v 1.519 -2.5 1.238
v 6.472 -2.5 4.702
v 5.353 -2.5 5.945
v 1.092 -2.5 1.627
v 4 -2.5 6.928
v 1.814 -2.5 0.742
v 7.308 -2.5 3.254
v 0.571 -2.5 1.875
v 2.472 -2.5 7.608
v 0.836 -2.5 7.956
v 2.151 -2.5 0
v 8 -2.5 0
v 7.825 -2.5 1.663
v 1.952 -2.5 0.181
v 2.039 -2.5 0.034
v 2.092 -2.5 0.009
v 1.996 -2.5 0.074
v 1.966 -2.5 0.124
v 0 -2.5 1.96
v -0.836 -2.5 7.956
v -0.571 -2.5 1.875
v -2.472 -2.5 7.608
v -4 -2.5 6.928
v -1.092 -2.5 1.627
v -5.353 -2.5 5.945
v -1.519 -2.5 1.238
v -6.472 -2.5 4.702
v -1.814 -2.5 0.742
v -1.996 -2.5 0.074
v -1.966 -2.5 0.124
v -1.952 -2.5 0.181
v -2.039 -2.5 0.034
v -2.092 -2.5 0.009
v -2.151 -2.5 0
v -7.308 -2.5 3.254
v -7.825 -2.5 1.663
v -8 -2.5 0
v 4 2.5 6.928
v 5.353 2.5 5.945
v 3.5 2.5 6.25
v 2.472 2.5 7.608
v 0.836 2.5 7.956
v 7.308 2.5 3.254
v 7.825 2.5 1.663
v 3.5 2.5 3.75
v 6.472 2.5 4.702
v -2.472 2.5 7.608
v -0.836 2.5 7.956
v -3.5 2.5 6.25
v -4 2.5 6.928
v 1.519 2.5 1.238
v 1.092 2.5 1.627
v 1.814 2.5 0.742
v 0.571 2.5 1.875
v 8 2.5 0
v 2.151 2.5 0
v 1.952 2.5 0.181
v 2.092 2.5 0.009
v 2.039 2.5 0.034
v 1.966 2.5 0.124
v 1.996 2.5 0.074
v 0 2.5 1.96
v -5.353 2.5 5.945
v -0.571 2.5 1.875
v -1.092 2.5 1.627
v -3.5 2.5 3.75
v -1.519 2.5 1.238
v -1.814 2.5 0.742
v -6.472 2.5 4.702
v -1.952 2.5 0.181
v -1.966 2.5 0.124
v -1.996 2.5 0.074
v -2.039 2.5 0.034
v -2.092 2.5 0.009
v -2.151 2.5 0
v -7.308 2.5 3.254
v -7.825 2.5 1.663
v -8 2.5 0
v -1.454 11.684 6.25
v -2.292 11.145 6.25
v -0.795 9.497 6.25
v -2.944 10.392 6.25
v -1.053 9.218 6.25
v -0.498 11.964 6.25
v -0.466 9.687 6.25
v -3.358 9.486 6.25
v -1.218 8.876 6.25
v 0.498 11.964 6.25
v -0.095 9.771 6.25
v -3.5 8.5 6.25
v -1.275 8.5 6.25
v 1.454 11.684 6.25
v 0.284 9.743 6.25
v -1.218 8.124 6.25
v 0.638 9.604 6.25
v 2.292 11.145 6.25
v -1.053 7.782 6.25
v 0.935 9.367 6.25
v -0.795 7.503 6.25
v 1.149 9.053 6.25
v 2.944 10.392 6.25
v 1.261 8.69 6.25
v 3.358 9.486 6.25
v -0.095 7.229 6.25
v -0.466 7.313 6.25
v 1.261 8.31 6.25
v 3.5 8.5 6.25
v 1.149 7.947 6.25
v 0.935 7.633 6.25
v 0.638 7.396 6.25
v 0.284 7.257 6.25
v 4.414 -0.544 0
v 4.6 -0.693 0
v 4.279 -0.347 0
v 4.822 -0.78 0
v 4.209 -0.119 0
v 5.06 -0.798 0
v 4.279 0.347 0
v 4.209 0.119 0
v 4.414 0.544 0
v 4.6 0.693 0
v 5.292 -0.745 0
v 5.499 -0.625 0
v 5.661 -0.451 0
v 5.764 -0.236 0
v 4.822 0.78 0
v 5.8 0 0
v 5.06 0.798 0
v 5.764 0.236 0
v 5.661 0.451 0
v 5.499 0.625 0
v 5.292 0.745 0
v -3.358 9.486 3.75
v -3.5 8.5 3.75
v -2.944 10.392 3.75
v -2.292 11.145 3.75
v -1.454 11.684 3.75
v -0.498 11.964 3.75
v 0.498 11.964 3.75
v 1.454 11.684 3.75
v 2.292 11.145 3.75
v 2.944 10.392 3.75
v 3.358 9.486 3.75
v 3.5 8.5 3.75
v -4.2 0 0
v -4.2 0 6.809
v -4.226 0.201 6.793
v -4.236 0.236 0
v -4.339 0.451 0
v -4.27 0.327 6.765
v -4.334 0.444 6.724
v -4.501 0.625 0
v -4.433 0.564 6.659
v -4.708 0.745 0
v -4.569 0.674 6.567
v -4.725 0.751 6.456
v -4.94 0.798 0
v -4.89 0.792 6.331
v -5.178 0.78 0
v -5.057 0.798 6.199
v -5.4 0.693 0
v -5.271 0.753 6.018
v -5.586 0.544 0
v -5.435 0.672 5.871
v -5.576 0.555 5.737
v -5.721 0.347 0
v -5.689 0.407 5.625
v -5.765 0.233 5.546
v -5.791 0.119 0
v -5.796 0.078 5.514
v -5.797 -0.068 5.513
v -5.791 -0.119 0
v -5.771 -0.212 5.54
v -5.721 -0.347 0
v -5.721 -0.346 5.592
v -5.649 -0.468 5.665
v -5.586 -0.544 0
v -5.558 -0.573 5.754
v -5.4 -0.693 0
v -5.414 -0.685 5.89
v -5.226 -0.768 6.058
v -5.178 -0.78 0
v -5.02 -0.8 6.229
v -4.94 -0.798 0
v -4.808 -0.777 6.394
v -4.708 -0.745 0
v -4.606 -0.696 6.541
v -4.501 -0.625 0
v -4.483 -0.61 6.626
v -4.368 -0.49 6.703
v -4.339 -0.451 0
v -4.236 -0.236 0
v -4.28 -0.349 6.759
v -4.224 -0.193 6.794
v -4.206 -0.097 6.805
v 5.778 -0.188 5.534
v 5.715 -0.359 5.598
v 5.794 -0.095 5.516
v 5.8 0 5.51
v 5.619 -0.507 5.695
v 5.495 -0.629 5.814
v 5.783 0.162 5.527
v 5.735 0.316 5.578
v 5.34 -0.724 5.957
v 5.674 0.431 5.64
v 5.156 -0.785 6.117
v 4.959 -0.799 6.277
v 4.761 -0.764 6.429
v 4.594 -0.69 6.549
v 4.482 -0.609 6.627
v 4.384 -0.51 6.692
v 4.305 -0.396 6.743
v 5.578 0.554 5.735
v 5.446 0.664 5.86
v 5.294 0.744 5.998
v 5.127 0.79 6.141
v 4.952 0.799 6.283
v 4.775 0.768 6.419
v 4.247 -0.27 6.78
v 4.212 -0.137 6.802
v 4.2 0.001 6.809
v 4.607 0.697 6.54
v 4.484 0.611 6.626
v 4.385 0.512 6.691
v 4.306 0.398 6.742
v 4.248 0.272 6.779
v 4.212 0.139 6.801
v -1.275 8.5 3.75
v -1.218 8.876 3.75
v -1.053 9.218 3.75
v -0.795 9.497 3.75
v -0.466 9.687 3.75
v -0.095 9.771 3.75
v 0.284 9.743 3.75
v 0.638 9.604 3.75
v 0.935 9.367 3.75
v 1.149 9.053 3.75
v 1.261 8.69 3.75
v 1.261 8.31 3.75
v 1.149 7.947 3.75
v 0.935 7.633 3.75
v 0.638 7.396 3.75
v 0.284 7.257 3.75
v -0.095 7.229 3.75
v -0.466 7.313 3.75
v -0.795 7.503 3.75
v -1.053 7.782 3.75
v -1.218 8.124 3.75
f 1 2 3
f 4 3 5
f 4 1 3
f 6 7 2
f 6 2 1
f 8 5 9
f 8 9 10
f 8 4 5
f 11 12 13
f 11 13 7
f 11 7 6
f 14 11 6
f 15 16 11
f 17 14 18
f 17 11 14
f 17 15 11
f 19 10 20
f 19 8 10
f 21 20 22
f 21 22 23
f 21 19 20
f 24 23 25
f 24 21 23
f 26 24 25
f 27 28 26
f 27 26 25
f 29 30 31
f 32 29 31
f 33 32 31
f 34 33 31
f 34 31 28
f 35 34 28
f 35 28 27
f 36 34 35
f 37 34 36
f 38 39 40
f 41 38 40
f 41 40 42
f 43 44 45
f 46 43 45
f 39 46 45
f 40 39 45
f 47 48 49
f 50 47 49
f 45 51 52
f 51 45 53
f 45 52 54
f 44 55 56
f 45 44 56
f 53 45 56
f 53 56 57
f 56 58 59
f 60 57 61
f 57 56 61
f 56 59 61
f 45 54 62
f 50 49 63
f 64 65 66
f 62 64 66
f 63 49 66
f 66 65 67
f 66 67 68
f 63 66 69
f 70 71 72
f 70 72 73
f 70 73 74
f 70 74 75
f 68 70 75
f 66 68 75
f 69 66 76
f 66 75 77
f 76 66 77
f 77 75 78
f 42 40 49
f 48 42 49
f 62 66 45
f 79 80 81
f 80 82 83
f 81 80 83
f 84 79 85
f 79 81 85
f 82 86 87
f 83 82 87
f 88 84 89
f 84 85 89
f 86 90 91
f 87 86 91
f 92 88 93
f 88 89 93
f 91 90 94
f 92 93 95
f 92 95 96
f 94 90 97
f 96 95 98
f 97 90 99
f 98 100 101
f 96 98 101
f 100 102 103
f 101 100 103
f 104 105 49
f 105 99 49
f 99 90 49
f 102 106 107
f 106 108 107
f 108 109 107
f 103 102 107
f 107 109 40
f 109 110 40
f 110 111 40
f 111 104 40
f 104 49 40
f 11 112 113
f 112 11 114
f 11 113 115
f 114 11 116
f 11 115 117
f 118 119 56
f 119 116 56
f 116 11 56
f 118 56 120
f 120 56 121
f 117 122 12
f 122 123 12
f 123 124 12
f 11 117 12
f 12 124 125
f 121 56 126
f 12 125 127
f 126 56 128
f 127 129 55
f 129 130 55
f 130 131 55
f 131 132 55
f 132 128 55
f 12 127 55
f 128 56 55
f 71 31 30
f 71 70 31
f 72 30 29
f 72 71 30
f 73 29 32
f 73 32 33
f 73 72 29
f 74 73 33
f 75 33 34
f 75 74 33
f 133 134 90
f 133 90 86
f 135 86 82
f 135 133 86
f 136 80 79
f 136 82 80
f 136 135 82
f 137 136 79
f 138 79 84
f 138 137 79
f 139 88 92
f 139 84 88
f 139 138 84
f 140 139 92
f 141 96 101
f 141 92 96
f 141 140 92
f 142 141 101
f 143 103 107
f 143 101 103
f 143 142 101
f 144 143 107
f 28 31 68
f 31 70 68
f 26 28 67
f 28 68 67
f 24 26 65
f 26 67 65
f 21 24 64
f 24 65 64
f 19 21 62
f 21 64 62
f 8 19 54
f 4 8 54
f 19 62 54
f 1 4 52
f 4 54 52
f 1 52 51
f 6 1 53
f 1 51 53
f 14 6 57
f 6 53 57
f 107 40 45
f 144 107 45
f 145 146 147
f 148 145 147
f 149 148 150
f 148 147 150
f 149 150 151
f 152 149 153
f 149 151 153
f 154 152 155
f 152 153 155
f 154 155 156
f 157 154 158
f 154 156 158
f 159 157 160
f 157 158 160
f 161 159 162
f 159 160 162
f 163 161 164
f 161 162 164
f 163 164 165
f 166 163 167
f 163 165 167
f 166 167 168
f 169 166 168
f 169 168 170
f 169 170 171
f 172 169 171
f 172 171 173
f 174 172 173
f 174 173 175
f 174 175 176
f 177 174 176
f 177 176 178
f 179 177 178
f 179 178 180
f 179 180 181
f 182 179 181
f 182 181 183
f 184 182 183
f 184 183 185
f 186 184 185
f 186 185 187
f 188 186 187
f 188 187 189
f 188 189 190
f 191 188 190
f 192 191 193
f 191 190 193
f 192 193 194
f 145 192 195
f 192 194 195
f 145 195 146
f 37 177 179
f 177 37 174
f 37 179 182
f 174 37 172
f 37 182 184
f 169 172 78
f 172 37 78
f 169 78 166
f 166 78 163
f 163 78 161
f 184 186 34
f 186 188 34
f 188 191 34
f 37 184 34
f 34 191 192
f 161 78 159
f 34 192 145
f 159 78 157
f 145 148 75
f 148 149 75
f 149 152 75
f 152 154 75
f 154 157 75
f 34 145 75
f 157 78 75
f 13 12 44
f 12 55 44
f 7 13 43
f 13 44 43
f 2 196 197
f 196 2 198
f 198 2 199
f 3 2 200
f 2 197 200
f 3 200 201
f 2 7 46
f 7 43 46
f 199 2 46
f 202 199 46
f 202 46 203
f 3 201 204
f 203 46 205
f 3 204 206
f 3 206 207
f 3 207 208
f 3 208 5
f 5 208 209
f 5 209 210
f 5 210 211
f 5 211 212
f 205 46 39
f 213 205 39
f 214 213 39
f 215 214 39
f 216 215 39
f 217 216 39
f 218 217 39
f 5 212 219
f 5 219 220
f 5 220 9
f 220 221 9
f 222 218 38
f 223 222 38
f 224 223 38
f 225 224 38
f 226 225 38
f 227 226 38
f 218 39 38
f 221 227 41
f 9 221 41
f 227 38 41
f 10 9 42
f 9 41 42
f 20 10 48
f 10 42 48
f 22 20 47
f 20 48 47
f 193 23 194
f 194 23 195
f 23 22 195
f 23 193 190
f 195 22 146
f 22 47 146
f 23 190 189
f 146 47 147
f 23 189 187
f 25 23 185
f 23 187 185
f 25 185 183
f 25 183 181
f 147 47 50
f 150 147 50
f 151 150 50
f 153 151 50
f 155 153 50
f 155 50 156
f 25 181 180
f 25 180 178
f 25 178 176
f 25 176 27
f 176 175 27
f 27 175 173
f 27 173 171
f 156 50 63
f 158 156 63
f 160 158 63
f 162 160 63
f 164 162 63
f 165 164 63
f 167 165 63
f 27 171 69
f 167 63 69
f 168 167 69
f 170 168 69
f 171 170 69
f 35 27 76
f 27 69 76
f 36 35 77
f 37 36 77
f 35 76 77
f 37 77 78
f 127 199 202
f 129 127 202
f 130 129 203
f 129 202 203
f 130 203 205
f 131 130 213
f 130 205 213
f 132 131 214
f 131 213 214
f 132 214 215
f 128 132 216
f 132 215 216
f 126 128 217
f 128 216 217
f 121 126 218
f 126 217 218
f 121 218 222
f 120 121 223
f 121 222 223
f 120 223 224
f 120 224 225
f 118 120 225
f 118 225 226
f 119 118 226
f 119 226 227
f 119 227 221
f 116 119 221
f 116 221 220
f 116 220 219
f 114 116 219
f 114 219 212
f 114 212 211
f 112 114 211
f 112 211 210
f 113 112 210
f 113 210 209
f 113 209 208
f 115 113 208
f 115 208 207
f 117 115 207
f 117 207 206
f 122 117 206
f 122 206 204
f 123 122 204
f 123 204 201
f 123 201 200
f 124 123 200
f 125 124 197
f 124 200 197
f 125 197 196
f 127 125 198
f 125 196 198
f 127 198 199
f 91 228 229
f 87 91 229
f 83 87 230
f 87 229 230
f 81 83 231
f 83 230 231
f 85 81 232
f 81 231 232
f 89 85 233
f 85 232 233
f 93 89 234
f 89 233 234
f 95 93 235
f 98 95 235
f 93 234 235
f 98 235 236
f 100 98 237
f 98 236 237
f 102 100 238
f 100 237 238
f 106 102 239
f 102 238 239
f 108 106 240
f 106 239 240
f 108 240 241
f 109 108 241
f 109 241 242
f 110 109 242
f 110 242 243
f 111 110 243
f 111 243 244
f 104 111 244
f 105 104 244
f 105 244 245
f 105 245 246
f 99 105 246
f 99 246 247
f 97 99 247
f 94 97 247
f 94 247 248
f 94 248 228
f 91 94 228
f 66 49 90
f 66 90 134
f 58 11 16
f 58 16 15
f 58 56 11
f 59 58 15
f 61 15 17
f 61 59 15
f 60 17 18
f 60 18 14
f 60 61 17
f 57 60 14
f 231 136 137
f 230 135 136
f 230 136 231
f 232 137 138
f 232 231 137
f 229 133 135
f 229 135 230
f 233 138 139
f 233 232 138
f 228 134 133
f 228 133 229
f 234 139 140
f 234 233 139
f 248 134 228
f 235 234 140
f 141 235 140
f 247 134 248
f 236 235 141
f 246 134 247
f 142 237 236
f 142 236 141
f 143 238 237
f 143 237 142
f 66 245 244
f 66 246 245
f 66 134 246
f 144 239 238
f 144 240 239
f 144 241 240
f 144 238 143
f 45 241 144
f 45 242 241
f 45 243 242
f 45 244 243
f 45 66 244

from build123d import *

# Parameters (mm, degrees)
BOSS_EXTRUDE1_DEPTH   = 2.5
SKETCH2_W             = 7
SKETCH2_H             = 2.5
BOSS_EXTRUDE2_DEPTH   = 9.5
CUT_EXTRUDE1_DEPTH    = 9.5
SKETCH4_R             = 1.275
CUT_EXTRUDE2_DEPTH    = 9.5
M2X0_4_TAPPED_HOLE1_D = 1.6
FILLET1_R             = 0.2


with BuildPart() as part:
    # Sketch1 → Boss-Extrude1 (new body, symmetric)
    with BuildSketch(Plane(origin=(0, 0, 0), x_dir=(1, 0, 0), z_dir=(0, 1, 0))):
        with BuildLine():
            Line((1.96, 0), (8, 0))
            ThreePointArc((8, 0), (0, -8), (-8, 0))
            Line((-8, 0), (-1.96, 0))
            ThreePointArc((-1.96, 0), (0, -1.96), (1.96, 0))
        make_face()
    extrude(amount=BOSS_EXTRUDE1_DEPTH, both=True)

    # Sketch2 → Boss-Extrude2 (add)
    with BuildSketch(Plane(origin=(0, 2.5, 0), x_dir=(1, 0, 0), z_dir=(0, 1, 0))):
        with Locations((0, -5)):
            Rectangle(SKETCH2_W, SKETCH2_H)
    extrude(amount=BOSS_EXTRUDE2_DEPTH)

    # Sketch3 → Cut-Extrude1 (cut)
    with BuildSketch(Plane(origin=(0, 0, 3.75), x_dir=(-1, 0, 0), z_dir=(0, 0, -1))):
        with BuildLine():
            Line((-3.5, 8.5), (-3.5, 14.886359519))
            Line((-3.5, 14.886359519), (0, 16.809201746))
            Line((0, 16.809201746), (3.5, 14.5))
            Line((3.5, 14.5), (3.5, 8.5))
            ThreePointArc((3.5, 8.5), (0, 12), (-3.5, 8.5))
        make_face()
    extrude(amount=-CUT_EXTRUDE1_DEPTH, mode=Mode.SUBTRACT)

    # Sketch4 → Cut-Extrude2 (cut)
    with BuildSketch(Plane(origin=(0, 0, 3.75), x_dir=(-1, 0, 0), z_dir=(0, 0, -1))):
        with Locations((0, 8.5)):
            Circle(SKETCH4_R)
    extrude(amount=-CUT_EXTRUDE2_DEPTH, mode=Mode.SUBTRACT)

    # M2x0.4 Tapped Hole1 (through all)
    with Locations(Plane(origin=(0, 0, 0), x_dir=(-1, 0, 0), z_dir=(0, 0, -1))):
        with Locations((-5, 0), (5, 0)):
            Hole(M2X0_4_TAPPED_HOLE1_D / 2)

    # Fillet1
    fillet1_edges = [part.edges().sort_by_distance(p)[0] for p in [
        (1.96, 0, 0),
        (-1.96, 0, 0),
    ]]
    fillet(fillet1_edges, radius=FILLET1_R)


solid = part.part
